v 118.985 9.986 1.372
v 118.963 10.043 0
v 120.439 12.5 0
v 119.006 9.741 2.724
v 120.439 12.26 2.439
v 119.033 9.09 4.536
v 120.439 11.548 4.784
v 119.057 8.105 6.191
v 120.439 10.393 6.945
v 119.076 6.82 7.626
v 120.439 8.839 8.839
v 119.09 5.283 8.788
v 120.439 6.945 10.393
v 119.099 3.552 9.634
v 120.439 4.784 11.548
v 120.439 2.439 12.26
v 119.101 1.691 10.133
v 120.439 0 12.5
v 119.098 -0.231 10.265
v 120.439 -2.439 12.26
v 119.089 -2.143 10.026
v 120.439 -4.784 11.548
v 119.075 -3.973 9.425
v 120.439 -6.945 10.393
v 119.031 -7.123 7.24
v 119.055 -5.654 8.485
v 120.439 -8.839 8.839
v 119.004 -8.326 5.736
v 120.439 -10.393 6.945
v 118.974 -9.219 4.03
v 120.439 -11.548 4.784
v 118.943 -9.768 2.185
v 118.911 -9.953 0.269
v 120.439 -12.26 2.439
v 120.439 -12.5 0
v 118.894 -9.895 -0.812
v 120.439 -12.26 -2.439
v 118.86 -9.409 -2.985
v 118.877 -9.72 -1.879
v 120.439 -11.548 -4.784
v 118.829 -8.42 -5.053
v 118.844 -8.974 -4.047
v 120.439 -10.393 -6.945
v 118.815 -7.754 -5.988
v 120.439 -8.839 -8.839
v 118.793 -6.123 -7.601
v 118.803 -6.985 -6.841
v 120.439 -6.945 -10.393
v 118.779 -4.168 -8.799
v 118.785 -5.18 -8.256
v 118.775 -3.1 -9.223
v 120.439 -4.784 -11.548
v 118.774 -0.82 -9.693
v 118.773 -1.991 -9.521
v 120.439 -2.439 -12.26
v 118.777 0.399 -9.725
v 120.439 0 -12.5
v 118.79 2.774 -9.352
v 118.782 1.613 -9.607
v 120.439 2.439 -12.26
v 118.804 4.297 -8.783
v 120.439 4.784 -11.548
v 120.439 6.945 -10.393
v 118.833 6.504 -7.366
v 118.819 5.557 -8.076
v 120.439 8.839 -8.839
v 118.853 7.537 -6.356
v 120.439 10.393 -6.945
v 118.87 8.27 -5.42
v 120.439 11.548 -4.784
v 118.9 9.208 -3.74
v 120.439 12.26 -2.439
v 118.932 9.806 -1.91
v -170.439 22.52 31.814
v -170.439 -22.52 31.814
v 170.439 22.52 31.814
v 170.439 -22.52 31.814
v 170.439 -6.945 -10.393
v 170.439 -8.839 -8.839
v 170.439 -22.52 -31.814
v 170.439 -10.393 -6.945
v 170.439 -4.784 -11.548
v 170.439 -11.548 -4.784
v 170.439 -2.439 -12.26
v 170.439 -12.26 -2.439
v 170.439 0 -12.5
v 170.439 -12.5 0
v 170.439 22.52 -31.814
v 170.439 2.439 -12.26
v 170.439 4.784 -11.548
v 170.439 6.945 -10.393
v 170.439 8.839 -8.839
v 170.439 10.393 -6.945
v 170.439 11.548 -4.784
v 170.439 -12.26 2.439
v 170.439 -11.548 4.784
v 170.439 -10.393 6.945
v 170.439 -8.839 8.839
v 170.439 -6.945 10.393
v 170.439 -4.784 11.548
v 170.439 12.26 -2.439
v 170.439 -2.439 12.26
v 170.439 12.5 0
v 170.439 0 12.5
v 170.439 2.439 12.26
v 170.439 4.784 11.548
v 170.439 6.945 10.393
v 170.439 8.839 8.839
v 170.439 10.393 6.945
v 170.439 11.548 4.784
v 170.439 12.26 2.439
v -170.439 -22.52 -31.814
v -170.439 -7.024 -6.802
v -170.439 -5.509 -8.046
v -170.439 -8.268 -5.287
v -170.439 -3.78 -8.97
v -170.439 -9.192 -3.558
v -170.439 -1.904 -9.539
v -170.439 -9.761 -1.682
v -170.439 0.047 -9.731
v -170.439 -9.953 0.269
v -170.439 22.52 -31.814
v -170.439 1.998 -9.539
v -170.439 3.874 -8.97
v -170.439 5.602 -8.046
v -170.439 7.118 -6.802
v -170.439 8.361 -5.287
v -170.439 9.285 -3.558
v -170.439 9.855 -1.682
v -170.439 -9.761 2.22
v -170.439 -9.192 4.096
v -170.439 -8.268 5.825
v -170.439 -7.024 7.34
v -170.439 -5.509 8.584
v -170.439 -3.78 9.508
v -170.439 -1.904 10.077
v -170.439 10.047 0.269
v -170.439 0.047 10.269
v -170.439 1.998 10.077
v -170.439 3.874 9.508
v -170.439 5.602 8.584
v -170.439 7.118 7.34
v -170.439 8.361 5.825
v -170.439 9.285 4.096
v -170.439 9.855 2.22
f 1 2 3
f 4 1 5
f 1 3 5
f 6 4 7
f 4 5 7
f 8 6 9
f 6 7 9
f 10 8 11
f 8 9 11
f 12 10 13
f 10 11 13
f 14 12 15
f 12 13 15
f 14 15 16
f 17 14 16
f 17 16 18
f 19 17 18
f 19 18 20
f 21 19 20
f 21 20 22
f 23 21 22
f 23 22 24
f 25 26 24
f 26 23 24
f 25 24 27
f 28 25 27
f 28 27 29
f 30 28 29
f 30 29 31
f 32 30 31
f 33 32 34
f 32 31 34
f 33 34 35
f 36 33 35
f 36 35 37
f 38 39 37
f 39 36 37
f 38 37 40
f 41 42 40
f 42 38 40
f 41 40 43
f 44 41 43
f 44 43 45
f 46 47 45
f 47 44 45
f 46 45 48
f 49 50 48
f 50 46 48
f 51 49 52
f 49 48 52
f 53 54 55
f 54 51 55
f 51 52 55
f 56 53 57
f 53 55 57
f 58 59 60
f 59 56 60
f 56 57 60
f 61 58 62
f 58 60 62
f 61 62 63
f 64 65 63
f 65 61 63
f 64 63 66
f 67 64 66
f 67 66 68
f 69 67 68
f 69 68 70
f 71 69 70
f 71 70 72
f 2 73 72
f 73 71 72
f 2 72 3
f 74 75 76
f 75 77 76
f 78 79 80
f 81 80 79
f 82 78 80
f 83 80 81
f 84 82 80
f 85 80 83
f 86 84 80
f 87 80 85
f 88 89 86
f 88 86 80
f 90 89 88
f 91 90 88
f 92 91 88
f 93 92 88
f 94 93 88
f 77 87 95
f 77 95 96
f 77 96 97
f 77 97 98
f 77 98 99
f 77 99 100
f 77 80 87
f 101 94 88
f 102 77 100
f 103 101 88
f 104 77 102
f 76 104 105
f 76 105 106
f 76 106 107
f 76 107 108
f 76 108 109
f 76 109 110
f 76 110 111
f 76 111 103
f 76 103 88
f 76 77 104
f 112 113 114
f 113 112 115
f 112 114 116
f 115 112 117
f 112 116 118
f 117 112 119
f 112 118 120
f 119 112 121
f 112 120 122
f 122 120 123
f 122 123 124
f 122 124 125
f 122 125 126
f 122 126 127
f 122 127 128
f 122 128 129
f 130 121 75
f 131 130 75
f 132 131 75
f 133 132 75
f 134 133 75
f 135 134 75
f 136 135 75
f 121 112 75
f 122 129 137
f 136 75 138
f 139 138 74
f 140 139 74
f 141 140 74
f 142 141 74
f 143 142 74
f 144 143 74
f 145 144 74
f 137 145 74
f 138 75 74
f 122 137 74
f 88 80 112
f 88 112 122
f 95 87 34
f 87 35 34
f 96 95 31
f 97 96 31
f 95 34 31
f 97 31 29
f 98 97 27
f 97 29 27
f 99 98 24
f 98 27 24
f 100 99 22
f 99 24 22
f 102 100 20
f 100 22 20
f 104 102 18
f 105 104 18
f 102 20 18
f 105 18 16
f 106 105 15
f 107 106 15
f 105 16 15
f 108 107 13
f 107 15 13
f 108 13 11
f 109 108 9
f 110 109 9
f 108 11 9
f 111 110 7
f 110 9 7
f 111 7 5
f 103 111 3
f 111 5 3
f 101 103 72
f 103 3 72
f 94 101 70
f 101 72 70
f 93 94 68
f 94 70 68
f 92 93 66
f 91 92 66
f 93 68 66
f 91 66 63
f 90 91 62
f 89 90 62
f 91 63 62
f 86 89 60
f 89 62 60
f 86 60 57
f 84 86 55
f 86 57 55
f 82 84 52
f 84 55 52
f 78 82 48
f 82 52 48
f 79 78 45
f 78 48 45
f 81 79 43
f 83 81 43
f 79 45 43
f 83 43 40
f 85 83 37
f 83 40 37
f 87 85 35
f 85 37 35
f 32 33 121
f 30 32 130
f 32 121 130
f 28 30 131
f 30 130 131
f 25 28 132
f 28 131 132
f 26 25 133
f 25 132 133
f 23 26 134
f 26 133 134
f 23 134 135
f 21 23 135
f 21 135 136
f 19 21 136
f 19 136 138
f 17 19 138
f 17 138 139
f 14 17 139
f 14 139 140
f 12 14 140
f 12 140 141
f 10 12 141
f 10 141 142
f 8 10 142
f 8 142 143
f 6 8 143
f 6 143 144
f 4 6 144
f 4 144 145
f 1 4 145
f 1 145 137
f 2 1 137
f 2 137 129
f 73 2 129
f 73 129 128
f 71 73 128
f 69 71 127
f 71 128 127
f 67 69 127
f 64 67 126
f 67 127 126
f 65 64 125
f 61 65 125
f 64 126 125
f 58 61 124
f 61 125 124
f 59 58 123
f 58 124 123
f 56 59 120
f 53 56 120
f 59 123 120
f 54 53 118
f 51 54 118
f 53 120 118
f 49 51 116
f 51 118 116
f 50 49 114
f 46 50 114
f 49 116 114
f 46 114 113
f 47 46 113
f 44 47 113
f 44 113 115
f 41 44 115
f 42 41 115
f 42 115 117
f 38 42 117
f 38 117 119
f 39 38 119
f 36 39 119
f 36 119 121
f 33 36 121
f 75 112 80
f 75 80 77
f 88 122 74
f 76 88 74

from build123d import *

# Parameters (mm, degrees)
F0_W     = 45.0391359627
F0_H     = 63.62747401
F1_DEPTH = 170.4394621775
F3_D     = 25
F3_DEPTH = 50
F3_TIP   = 7.5107577378
F5_D     = 20


with BuildPart() as f1:
    # F0 (on Right) → F1 (new body, symmetric)
    with BuildSketch(Plane.YZ):
        Rectangle(F0_W, F0_H)
    extrude(amount=F1_DEPTH, both=True)

    # F3
    with Locations(Plane.YZ.offset(170.4394621775)):
        with Locations((0, 0)):
            Hole(F3_D / 2, depth=F3_DEPTH)
            with Locations((0, 0, -(F3_DEPTH + F3_TIP / 2))):  # 118° drill point
                Cone(0, F3_D / 2, F3_TIP, mode=Mode.SUBTRACT)

    # F5 (through all)
    with Locations(Plane.YZ.offset(170.4394621775)):
        with Locations((0.0467002392, 0.2690460533)):
            Hole(F5_D / 2)


solid = f1.part
